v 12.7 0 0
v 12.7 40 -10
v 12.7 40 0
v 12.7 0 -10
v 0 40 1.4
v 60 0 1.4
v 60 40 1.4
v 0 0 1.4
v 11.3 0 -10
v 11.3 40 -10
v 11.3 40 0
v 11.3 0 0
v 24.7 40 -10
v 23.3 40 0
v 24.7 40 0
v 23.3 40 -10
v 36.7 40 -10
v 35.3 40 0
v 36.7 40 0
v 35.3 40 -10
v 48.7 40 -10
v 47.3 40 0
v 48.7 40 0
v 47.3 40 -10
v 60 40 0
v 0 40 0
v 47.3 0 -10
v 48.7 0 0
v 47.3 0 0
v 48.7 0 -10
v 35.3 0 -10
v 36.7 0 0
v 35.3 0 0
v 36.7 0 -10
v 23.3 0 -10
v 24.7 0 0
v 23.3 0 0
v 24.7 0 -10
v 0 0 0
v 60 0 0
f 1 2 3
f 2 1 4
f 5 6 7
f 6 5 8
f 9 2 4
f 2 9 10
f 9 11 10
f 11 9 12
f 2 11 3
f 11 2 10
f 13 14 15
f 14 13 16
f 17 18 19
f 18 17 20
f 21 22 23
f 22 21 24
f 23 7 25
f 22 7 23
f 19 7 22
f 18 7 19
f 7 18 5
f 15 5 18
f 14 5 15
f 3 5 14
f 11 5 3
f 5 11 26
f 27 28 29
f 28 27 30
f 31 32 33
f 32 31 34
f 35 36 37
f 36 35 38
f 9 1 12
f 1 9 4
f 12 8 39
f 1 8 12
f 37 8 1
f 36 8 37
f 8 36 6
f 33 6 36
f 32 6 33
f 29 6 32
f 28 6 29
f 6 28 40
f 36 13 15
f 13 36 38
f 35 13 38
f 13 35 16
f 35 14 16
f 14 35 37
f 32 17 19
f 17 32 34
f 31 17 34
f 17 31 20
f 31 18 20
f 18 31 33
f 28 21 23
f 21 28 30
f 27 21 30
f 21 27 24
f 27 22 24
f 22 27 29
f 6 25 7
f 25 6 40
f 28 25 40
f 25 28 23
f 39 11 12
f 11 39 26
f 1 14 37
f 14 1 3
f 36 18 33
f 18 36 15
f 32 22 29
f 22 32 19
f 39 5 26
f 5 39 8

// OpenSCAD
$fn = 32;

// ----------------------------------------------------------------------
// Ribbed panel: 1.4 mm panel
// ----------------------------------------------------------------------

// --- parameters (mm) ---
panel_l = 60;             // panel length, X
panel_w = 40;             // panel width, Y
panel_t = 1.4;            // panel thickness, Z
rib_t = 1.4;              // rib thickness
rib_h = 10;               // rib height below the panel
ribs = 4;                 // number of ribs

total_h = panel_t + rib_h;  // overall height

union() {
  cube([panel_l, panel_w, panel_t]);
  for (i = [1 : ribs])
    translate([i * panel_l / (ribs + 1) - rib_t / 2, 0, -rib_h])
      cube([rib_t, panel_w, rib_h + panel_t]);
}
